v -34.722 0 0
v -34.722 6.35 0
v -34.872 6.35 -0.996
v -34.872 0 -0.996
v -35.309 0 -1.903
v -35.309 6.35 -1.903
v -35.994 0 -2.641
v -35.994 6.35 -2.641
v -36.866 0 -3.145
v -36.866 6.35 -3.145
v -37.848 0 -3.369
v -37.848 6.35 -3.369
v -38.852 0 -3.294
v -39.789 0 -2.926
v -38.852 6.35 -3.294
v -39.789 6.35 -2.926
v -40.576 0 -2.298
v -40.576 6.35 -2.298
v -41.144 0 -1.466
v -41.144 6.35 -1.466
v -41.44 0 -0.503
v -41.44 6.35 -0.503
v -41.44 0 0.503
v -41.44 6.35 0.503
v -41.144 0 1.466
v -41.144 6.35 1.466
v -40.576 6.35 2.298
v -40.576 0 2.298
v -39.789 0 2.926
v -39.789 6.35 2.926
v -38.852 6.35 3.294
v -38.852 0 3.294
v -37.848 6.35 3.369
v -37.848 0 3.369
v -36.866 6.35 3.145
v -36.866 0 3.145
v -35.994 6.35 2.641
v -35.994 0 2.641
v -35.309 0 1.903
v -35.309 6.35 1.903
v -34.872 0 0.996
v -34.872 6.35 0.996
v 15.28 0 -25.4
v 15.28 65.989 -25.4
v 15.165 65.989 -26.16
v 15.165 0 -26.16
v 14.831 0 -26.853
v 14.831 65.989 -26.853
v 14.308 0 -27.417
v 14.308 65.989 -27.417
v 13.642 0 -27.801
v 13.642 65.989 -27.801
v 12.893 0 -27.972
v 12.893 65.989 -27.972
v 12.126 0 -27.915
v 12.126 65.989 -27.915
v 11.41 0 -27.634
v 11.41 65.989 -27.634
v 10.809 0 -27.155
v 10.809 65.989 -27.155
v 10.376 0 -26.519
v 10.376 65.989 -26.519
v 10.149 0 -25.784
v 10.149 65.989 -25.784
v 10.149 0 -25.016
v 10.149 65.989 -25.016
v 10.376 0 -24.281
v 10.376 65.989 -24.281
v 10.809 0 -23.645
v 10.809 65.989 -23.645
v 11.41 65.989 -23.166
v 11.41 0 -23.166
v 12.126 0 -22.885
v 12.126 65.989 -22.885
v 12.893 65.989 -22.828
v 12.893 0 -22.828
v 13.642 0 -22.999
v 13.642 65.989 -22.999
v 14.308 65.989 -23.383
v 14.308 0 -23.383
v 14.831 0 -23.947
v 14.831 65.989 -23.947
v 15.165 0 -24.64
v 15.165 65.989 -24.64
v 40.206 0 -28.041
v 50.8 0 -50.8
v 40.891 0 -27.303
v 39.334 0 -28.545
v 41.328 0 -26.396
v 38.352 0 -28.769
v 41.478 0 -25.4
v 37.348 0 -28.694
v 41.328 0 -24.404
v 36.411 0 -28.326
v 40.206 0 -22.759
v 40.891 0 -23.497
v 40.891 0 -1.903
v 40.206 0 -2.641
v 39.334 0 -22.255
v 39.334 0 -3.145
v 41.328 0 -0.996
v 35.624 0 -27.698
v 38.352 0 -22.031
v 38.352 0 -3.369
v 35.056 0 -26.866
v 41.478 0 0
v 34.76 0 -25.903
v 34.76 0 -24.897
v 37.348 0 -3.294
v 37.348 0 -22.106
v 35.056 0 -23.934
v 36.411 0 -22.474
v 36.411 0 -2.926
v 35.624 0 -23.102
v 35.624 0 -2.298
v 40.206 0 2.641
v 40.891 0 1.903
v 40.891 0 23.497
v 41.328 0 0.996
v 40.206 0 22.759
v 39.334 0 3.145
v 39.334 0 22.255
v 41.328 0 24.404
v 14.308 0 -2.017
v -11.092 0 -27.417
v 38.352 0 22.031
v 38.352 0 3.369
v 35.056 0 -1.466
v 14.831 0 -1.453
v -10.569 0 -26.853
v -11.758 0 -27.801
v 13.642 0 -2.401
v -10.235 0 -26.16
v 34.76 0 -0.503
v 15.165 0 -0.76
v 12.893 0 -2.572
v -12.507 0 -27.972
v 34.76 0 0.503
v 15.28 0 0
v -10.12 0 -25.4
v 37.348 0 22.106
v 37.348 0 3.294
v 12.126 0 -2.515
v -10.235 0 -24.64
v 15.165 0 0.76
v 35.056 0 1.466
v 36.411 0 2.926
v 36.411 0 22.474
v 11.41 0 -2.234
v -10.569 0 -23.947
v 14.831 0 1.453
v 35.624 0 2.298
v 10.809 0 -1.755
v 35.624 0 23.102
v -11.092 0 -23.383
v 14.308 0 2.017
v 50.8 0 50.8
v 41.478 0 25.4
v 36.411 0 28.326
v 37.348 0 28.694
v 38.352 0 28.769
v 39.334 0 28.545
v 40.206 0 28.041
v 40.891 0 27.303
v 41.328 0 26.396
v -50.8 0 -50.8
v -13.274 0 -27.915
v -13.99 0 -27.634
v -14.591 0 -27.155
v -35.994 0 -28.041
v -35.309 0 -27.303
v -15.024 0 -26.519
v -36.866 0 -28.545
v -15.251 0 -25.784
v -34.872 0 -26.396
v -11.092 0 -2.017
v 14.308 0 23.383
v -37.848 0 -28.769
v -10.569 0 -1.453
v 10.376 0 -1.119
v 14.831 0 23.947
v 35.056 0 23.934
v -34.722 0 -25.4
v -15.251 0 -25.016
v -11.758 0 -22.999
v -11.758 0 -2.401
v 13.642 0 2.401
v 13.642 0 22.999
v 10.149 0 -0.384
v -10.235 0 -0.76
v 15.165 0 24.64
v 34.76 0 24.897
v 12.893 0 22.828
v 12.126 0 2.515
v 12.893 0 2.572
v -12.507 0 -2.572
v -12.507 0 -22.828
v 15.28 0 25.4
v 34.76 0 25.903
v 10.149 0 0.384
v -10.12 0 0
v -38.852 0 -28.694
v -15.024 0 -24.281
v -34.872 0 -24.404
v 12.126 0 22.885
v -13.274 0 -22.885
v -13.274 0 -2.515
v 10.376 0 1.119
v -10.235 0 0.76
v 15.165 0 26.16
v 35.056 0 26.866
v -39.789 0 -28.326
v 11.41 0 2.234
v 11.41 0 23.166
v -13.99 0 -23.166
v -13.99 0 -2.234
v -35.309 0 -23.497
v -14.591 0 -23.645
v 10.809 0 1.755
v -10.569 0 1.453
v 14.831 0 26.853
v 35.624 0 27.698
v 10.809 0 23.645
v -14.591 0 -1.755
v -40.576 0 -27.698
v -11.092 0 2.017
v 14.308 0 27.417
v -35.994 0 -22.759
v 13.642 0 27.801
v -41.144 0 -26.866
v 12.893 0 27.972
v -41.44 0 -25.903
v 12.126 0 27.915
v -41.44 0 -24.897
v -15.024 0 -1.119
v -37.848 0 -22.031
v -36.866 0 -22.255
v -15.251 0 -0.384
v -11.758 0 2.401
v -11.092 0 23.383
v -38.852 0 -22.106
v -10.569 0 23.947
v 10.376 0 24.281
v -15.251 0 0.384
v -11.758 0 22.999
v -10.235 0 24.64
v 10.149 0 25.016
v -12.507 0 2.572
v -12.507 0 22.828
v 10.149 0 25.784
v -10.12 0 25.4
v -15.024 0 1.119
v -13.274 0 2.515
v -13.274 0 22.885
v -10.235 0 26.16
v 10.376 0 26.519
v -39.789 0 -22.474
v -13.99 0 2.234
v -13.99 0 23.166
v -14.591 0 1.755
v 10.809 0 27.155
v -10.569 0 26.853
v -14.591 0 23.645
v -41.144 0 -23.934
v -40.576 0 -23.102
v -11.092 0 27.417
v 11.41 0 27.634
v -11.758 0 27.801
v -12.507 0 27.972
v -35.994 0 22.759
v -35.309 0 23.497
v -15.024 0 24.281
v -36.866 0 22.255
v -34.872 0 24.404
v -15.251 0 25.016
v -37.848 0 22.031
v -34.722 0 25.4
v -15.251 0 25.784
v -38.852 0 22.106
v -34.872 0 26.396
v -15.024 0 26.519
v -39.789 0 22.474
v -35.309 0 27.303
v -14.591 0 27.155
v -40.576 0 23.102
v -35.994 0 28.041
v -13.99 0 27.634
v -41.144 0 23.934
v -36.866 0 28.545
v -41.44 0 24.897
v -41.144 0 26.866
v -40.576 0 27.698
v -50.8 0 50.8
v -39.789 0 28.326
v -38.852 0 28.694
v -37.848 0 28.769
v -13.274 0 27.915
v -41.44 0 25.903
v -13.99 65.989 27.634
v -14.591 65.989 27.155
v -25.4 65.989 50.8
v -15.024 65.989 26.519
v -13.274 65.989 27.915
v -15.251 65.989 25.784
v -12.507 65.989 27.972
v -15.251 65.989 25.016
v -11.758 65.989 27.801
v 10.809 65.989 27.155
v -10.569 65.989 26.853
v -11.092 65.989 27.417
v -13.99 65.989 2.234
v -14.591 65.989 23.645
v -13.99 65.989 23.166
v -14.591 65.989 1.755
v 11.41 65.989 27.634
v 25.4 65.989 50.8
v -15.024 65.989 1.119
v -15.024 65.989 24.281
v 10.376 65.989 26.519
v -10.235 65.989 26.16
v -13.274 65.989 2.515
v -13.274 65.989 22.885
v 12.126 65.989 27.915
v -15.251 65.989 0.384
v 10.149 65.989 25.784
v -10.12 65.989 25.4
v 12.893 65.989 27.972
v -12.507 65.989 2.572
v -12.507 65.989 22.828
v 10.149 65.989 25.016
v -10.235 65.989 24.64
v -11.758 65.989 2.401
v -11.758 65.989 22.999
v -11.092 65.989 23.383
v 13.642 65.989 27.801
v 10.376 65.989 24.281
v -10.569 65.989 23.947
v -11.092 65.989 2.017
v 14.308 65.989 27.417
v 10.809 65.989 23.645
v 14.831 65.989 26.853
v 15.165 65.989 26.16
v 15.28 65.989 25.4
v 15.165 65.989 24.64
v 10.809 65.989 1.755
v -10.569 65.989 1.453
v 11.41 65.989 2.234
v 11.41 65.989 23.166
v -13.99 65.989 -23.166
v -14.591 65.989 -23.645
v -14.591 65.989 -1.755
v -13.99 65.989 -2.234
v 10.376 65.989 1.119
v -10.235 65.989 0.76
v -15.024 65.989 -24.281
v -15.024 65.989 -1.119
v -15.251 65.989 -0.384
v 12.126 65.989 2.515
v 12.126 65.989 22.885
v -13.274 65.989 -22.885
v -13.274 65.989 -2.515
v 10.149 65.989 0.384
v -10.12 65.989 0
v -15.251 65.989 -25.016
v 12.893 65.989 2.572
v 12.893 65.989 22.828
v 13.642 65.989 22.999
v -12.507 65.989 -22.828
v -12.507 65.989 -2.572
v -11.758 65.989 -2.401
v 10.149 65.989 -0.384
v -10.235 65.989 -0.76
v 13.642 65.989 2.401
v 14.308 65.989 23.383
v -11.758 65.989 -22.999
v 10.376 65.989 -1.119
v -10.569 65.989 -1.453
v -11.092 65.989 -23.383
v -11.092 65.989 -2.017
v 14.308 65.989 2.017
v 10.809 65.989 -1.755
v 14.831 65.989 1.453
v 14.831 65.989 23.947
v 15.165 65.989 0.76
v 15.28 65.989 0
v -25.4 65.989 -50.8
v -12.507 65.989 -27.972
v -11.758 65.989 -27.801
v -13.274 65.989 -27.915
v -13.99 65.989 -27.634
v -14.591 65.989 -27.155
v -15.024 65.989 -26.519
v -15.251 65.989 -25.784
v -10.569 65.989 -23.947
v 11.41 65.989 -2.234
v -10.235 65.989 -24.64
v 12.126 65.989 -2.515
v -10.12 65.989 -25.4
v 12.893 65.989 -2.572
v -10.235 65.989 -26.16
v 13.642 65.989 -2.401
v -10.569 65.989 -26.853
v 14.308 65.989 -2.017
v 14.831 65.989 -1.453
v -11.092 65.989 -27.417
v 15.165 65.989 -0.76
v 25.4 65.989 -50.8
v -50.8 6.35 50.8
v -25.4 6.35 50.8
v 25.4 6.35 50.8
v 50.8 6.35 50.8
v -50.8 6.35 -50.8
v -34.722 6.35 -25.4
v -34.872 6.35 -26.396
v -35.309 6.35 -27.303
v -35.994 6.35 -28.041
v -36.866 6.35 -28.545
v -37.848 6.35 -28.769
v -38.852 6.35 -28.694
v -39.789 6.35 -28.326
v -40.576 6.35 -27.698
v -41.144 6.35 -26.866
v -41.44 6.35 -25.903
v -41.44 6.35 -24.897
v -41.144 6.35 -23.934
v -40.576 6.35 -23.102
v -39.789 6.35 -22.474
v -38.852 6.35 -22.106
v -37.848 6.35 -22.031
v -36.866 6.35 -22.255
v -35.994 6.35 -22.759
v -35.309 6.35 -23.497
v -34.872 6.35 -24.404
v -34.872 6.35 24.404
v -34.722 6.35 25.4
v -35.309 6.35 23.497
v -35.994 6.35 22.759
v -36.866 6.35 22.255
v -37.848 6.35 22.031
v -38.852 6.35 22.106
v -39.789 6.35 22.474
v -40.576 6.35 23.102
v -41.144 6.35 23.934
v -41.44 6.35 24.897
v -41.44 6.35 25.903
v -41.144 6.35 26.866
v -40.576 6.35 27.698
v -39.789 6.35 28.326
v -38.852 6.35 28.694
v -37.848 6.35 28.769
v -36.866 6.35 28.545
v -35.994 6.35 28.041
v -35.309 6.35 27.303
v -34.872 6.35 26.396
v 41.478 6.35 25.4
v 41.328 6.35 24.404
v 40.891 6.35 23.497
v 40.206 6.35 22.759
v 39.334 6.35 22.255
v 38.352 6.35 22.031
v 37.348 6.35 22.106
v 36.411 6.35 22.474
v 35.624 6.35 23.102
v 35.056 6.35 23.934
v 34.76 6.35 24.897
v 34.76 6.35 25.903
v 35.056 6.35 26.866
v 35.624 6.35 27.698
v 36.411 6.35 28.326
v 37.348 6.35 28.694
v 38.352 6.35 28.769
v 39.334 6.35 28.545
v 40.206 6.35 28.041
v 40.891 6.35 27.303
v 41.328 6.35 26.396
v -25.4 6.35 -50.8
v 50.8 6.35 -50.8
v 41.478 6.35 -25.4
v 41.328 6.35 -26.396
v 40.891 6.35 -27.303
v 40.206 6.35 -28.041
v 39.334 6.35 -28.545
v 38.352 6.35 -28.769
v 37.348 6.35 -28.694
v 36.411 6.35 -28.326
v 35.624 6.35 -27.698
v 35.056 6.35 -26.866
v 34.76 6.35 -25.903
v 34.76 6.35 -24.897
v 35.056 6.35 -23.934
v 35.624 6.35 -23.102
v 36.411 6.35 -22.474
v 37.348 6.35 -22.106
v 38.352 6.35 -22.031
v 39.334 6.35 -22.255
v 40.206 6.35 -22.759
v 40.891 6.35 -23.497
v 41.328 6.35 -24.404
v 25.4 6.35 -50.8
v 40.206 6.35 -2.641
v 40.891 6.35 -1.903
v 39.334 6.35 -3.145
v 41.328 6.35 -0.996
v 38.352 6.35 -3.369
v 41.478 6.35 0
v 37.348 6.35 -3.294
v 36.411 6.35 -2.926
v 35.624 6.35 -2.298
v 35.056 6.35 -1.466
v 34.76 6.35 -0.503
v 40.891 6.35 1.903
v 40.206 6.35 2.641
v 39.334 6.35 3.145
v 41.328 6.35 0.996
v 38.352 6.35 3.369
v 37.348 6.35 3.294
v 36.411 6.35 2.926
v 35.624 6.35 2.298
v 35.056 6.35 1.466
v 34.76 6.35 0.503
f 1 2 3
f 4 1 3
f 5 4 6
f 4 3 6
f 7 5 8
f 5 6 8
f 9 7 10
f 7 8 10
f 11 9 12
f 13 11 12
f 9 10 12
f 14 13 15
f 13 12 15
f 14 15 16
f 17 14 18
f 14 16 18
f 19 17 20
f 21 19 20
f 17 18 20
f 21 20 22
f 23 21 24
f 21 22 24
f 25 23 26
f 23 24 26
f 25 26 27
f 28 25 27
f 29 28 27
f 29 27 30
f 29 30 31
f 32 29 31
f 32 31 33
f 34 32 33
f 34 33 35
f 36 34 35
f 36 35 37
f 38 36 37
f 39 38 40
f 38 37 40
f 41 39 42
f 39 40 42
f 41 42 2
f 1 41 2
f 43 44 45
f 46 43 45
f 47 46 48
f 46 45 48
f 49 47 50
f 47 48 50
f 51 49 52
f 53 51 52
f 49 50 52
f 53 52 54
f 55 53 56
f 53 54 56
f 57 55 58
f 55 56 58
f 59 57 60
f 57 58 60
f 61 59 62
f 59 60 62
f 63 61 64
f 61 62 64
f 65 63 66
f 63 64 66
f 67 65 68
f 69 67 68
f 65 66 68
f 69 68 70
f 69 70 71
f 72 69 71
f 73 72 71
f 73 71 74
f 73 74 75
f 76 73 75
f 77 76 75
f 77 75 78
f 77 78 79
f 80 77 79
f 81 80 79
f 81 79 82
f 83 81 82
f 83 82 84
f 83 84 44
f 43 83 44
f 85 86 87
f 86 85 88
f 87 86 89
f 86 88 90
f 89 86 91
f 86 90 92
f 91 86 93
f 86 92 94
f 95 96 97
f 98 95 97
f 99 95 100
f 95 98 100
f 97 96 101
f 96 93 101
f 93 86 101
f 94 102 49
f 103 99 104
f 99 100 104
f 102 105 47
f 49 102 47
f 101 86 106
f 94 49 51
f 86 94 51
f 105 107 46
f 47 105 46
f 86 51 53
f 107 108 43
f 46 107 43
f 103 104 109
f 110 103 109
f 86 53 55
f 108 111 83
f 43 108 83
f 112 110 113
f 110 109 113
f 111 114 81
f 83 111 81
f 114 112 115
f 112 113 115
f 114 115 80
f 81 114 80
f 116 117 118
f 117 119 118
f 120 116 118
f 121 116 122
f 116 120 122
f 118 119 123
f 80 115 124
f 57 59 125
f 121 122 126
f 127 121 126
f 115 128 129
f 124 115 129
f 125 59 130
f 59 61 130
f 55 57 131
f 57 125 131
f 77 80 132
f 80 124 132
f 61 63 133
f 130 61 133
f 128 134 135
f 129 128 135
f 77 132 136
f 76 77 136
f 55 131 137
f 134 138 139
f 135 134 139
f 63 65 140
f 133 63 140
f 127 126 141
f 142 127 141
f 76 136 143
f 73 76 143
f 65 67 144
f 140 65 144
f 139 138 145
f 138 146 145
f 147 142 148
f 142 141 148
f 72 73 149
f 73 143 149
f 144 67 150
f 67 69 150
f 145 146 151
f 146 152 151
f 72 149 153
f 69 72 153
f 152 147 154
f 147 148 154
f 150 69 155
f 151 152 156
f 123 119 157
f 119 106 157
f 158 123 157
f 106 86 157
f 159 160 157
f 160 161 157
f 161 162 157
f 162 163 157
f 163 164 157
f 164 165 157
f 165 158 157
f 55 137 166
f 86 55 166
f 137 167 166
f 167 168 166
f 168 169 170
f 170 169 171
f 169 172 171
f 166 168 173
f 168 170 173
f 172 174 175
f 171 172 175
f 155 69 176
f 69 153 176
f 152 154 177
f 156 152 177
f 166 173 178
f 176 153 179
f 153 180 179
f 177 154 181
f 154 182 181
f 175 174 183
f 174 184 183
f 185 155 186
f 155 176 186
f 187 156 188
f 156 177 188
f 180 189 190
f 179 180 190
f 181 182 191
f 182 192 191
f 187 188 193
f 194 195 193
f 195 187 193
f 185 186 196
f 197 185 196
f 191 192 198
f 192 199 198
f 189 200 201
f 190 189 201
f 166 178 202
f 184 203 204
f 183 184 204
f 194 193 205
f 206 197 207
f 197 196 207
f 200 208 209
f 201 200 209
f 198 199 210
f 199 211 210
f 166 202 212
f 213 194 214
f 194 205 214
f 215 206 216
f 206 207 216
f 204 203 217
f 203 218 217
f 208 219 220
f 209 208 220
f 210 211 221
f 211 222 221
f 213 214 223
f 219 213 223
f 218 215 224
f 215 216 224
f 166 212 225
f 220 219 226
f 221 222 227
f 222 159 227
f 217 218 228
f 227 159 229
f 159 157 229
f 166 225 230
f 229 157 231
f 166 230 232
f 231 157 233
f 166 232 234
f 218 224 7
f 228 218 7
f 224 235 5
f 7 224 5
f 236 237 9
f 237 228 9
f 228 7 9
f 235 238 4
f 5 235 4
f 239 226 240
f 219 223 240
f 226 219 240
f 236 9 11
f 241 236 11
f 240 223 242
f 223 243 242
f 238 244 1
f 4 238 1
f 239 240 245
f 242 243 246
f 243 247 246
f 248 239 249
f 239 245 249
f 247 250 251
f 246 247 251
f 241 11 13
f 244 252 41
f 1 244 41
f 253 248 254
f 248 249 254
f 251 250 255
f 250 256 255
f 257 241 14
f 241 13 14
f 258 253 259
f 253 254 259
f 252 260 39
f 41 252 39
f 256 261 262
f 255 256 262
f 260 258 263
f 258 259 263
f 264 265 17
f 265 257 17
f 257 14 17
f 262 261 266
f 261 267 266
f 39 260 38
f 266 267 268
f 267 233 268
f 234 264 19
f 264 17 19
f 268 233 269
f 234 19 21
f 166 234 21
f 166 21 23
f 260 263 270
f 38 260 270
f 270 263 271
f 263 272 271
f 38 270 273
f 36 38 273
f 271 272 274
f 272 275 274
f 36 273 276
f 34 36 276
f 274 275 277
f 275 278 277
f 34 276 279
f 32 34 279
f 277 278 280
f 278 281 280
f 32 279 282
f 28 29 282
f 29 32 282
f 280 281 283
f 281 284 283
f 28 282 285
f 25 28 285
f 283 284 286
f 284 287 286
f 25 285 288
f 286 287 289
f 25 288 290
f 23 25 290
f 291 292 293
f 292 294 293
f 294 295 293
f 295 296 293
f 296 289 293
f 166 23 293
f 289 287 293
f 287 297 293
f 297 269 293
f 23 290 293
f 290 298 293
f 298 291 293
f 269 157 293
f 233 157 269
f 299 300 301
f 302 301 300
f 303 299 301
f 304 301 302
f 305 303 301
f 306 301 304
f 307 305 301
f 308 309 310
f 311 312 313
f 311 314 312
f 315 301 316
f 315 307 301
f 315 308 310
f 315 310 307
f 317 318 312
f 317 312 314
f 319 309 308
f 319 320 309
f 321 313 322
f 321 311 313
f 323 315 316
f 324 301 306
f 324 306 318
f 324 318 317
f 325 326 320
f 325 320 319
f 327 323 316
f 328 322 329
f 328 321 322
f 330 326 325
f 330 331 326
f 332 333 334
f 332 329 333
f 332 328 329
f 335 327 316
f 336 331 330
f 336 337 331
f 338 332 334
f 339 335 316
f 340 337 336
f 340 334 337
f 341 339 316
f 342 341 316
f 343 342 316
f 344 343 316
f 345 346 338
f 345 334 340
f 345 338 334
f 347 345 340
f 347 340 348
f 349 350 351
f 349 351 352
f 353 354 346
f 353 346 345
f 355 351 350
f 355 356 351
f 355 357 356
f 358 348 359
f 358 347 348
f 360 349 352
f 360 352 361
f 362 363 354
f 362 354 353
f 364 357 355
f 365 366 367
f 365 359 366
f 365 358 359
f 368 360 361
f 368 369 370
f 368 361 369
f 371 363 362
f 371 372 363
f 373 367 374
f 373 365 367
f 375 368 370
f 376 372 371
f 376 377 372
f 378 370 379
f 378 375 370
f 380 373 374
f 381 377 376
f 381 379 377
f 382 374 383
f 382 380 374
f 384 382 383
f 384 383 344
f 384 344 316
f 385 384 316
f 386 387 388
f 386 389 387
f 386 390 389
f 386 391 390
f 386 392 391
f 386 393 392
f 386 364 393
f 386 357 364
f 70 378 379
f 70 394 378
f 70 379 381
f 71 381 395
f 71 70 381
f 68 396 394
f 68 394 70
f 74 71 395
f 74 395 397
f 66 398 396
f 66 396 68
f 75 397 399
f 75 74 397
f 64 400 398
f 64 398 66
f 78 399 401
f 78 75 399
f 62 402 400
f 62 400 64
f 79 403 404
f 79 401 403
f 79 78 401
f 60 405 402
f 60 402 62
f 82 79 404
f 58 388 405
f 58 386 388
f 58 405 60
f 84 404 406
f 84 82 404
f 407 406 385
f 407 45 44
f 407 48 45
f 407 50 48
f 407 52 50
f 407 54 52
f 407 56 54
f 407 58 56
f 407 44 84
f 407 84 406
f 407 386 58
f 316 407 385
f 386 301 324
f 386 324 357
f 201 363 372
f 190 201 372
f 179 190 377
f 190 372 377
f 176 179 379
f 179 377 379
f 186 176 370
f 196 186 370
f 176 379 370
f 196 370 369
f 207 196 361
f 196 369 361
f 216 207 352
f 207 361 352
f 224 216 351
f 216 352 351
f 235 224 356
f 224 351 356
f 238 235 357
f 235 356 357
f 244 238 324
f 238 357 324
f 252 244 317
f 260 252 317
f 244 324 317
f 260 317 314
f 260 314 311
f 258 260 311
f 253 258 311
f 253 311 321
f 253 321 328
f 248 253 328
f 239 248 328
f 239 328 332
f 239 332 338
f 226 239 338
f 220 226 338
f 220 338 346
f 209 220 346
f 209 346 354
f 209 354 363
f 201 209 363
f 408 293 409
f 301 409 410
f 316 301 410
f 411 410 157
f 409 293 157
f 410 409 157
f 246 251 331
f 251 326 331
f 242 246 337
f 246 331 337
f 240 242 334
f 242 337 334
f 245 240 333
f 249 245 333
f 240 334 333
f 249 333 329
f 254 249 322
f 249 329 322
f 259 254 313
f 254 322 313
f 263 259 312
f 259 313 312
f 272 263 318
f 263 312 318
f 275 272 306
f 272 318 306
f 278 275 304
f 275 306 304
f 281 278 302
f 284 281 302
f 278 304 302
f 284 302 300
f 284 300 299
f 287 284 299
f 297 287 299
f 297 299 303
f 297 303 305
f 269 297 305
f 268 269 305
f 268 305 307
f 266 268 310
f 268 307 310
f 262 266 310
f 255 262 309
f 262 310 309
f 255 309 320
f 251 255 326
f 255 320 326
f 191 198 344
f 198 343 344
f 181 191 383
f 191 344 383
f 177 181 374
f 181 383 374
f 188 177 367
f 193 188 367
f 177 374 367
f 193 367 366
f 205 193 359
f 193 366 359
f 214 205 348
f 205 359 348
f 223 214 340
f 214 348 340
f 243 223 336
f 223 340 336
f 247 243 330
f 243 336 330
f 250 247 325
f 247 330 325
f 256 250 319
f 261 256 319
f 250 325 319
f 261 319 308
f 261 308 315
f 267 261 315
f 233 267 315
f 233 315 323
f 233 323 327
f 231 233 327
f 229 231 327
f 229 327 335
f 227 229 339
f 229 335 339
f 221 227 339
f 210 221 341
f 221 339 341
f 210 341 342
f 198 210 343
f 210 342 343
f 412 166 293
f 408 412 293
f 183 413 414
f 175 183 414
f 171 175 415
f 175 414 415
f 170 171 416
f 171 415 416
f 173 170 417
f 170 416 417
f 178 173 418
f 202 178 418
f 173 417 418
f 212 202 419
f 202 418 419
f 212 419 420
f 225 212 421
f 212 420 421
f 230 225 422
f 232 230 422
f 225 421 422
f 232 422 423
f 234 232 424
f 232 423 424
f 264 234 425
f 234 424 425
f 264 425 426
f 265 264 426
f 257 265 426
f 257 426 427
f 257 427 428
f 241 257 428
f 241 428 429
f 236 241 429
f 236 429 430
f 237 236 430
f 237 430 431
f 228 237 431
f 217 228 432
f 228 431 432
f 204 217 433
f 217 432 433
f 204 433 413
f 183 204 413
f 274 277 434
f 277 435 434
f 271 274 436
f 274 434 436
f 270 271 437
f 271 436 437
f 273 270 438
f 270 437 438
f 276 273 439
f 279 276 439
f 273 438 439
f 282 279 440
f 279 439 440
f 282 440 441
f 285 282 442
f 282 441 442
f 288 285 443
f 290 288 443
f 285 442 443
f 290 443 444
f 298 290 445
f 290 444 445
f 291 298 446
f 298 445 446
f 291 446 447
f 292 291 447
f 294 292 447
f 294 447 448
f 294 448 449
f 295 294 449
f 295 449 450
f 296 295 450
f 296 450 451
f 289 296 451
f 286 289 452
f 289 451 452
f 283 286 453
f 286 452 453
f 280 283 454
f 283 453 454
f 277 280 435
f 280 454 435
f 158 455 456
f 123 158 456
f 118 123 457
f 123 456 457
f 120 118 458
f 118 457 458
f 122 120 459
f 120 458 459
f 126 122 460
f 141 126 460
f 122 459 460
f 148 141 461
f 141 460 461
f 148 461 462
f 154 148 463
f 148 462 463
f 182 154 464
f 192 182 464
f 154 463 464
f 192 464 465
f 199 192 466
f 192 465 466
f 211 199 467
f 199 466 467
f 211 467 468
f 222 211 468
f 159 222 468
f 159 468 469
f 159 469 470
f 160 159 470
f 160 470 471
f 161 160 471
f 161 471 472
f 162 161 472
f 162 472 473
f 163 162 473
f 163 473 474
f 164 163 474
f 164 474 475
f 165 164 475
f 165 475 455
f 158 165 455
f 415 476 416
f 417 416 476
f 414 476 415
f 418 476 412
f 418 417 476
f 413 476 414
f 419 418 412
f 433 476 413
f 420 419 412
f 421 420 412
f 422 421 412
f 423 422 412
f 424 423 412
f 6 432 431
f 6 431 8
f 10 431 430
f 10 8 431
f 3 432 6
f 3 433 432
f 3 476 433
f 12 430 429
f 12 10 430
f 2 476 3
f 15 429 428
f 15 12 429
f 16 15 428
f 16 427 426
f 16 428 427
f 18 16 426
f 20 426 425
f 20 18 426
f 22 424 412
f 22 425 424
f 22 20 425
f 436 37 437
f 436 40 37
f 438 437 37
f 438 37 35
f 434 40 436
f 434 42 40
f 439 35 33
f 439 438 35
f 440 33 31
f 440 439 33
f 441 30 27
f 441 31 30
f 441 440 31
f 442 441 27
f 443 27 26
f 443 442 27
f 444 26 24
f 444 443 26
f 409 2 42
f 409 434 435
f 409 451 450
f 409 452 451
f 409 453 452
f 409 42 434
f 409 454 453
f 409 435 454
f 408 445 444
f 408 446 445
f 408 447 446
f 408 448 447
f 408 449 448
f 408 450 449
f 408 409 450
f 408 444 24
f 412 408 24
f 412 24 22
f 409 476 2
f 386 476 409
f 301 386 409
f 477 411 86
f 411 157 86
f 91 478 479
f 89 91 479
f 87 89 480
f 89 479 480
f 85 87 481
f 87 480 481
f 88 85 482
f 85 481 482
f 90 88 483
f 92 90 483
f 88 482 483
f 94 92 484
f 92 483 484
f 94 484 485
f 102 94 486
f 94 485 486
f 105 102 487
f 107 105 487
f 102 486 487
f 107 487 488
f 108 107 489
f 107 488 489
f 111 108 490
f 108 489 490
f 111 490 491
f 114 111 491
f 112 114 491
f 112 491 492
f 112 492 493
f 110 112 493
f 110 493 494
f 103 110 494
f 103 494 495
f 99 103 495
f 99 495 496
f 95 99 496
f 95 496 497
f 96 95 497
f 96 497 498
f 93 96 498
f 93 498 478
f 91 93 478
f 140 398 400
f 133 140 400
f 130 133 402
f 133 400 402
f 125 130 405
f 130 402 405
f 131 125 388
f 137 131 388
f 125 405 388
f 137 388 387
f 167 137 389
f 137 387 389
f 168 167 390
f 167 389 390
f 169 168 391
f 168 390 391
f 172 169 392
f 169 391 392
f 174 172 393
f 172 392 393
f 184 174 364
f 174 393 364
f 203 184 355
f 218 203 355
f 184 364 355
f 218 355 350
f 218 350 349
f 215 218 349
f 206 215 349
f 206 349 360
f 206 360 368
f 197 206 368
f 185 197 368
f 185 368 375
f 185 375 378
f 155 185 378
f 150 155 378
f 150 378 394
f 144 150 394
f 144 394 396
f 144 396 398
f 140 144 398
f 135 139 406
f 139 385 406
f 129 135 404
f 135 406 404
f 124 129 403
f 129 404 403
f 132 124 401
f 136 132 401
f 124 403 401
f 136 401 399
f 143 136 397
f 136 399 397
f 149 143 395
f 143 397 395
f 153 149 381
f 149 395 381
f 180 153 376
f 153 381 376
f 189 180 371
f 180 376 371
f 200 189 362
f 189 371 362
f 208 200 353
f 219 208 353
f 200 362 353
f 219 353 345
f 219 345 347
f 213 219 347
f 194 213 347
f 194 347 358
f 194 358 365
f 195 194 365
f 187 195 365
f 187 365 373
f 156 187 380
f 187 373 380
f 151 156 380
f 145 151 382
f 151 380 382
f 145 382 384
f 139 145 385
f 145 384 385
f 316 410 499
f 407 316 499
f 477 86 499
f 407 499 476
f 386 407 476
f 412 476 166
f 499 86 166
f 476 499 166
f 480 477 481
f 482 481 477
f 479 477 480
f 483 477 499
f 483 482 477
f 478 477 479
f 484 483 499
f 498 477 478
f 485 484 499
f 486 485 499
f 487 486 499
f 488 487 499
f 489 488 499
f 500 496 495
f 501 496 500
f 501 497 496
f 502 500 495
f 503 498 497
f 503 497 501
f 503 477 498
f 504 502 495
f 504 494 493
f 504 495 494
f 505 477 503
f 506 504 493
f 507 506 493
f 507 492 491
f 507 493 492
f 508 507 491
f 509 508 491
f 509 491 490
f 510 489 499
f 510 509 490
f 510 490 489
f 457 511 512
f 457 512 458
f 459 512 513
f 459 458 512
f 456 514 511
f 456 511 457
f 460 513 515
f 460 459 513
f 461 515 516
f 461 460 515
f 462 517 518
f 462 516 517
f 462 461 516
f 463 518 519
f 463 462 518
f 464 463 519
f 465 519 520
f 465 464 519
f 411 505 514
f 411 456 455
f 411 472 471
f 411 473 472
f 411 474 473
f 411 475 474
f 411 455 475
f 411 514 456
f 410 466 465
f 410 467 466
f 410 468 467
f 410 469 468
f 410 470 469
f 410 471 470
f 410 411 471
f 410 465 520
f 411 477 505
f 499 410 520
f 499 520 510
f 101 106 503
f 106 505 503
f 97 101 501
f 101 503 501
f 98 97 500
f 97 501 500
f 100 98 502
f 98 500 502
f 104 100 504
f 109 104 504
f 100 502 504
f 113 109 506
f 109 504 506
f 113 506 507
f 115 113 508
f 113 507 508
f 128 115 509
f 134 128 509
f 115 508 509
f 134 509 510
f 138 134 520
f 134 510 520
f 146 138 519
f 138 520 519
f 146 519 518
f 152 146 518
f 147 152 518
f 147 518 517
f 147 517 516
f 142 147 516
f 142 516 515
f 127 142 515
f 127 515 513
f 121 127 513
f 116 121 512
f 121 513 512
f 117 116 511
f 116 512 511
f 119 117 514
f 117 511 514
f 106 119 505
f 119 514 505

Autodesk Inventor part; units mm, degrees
ref_plane "XZ Plane" through (0, 0, 0) normal (0, 1, 0) x (-1, 0, 0)
sketch "Sketch1" plane through (0, 0, 0) normal (0, 1, 0) x (-1, 0, 0)
  line L0 (50.8, 50.8) -> (-50.8, 50.8)
  line L1 (-50.8, 50.8) -> (-50.8, -50.8)
  line L2 (-50.8, -50.8) -> (50.8, -50.8)
  line L3 (50.8, -50.8) -> (50.8, 50.8)
  line L4 (50.8, 50.8) -> (-50.8, -50.8) construction
  line L5 (-50.8, 50.8) -> (50.8, -50.8) construction
  point P0 (0, 0)
  dimension "d0" = 101.6
  dimension "d1" = 101.6
extrude "Extrusion1" add sketch "Sketch1" along normal blind 6.35
sketch "Sketch4" plane through (0, 6.35, 0) normal (0, 1, 0) x (1, 0, 0)
  line L0 (-25.4, -50.8) -> (25.4, -50.8)
  line L1 (25.4, -50.8) -> (25.4, 50.8)
  line L2 (25.4, 50.8) -> (-25.4, 50.8)
  line L3 (-25.4, 50.8) -> (-25.4, -50.8)
  line L4 (-25.4, -50.8) -> (25.4, 50.8) construction
  line L5 (25.4, -50.8) -> (-25.4, 50.8) construction
  line L6 (-50.8, 50.8) -> (-50.8, -50.8) projected
  line L7 (-50.8, -50.8) -> (50.8, -50.8) projected
  point P0 (0, 0)
  point P1 (0, 0)
  dimension "d15" = 50.8
  dimension "d16" = 25.4
  dimension "d17" = 101.6
extrude "Extrusion4" add sketch "Sketch4" along normal blind 59.6392
sketch "Sketch12" plane through (0, 65.9892, 0) normal (0, 1, 0) x (1, 0, 0)
  circle A0 centre (-12.7, -25.4) radius 2.5797
  line L0 (-25.4, -50.8) -> (25.4, -50.8) projected
  line L1 (-25.4, 50.8) -> (-25.4, -50.8) projected
  line L2 (-12.7, -25.4) -> (-12.7, 50.8) construction
  line L3 (-12.7, -25.4) -> (25.4, -25.4) construction
  circle A1 centre (-12.7, 0) radius 2.5797
  circle A2 centre (-12.7, 25.4) radius 2.5797
  circle A3 centre (12.7, -25.4) radius 2.5797
  circle A4 centre (12.7, 0) radius 2.5797
  circle A5 centre (12.7, 25.4) radius 2.5797
  point P0 (0, 0)
  dimension "d52" = 5.1594
  dimension "d53" = 25.4
  dimension "d54" = 12.7
  dimension "d57" = 25.4
  dimension "d60" = 25.4
extrude "Extrusion8" cut sketch "Sketch12" against normal through all
sketch "Sketch13" plane through (0, 6.35, 0) normal (0, 1, 0) x (1, 0, 0)
  circle A0 centre (-38.1, -25.4) radius 3.3782
  line L0 (-50.8, -50.8) -> (-25.4, -50.8) projected
  line L1 (-50.8, 50.8) -> (-50.8, -50.8) projected
  line L2 (-38.1, -25.4) -> (-38.1, 50.8) construction
  line L3 (-25.4, 50.8) -> (-50.8, 50.8) projected
  line L4 (-38.1, -25.4) -> (50.8, -25.4) construction
  line L5 (50.8, -50.8) -> (50.8, 50.8) projected
  line L6 (-38.1, 0) -> (50.8, 0) construction
  circle A1 centre (-38.1, 0) radius 3.3782
  line L7 (-38.1, 0) -> (-38.1, 76.2) construction
  line L8 (-38.1, 25.4) -> (50.8, 25.4) construction
  circle A2 centre (-38.1, 25.4) radius 3.3782
  line L9 (-38.1, 25.4) -> (-38.1, 101.6) construction
  line L10 (38.1, -25.4) -> (127, -25.4) construction
  circle A3 centre (38.1, -25.4) radius 3.3782
  line L11 (38.1, -25.4) -> (38.1, 50.8) construction
  line L12 (38.1, 0) -> (127, 0) construction
  circle A4 centre (38.1, 0) radius 3.3782
  line L13 (38.1, 0) -> (38.1, 76.2) construction
  line L14 (38.1, 25.4) -> (127, 25.4) construction
  circle A5 centre (38.1, 25.4) radius 3.3782
  line L15 (38.1, 25.4) -> (38.1, 101.6) construction
  point P0 (0, 0)
  dimension "d65" = 6.7564
  dimension "d66" = 25.4
  dimension "d67" = 12.7
  dimension "d70" = 25.4
  dimension "d73" = 76.2
extrude "Extrusion9" cut sketch "Sketch13" against normal through all
equation "\"d0\" = width"
equation "\"d1\" = length"
equation "\"d2\" = thickness"
equation "\"width\" = 101.6"
equation "\"length\" = 101.6"
equation "\"thickness\" = 6.35"
properties part number "SupportPlateMotorMountV01" material "Aluminum 6061"
